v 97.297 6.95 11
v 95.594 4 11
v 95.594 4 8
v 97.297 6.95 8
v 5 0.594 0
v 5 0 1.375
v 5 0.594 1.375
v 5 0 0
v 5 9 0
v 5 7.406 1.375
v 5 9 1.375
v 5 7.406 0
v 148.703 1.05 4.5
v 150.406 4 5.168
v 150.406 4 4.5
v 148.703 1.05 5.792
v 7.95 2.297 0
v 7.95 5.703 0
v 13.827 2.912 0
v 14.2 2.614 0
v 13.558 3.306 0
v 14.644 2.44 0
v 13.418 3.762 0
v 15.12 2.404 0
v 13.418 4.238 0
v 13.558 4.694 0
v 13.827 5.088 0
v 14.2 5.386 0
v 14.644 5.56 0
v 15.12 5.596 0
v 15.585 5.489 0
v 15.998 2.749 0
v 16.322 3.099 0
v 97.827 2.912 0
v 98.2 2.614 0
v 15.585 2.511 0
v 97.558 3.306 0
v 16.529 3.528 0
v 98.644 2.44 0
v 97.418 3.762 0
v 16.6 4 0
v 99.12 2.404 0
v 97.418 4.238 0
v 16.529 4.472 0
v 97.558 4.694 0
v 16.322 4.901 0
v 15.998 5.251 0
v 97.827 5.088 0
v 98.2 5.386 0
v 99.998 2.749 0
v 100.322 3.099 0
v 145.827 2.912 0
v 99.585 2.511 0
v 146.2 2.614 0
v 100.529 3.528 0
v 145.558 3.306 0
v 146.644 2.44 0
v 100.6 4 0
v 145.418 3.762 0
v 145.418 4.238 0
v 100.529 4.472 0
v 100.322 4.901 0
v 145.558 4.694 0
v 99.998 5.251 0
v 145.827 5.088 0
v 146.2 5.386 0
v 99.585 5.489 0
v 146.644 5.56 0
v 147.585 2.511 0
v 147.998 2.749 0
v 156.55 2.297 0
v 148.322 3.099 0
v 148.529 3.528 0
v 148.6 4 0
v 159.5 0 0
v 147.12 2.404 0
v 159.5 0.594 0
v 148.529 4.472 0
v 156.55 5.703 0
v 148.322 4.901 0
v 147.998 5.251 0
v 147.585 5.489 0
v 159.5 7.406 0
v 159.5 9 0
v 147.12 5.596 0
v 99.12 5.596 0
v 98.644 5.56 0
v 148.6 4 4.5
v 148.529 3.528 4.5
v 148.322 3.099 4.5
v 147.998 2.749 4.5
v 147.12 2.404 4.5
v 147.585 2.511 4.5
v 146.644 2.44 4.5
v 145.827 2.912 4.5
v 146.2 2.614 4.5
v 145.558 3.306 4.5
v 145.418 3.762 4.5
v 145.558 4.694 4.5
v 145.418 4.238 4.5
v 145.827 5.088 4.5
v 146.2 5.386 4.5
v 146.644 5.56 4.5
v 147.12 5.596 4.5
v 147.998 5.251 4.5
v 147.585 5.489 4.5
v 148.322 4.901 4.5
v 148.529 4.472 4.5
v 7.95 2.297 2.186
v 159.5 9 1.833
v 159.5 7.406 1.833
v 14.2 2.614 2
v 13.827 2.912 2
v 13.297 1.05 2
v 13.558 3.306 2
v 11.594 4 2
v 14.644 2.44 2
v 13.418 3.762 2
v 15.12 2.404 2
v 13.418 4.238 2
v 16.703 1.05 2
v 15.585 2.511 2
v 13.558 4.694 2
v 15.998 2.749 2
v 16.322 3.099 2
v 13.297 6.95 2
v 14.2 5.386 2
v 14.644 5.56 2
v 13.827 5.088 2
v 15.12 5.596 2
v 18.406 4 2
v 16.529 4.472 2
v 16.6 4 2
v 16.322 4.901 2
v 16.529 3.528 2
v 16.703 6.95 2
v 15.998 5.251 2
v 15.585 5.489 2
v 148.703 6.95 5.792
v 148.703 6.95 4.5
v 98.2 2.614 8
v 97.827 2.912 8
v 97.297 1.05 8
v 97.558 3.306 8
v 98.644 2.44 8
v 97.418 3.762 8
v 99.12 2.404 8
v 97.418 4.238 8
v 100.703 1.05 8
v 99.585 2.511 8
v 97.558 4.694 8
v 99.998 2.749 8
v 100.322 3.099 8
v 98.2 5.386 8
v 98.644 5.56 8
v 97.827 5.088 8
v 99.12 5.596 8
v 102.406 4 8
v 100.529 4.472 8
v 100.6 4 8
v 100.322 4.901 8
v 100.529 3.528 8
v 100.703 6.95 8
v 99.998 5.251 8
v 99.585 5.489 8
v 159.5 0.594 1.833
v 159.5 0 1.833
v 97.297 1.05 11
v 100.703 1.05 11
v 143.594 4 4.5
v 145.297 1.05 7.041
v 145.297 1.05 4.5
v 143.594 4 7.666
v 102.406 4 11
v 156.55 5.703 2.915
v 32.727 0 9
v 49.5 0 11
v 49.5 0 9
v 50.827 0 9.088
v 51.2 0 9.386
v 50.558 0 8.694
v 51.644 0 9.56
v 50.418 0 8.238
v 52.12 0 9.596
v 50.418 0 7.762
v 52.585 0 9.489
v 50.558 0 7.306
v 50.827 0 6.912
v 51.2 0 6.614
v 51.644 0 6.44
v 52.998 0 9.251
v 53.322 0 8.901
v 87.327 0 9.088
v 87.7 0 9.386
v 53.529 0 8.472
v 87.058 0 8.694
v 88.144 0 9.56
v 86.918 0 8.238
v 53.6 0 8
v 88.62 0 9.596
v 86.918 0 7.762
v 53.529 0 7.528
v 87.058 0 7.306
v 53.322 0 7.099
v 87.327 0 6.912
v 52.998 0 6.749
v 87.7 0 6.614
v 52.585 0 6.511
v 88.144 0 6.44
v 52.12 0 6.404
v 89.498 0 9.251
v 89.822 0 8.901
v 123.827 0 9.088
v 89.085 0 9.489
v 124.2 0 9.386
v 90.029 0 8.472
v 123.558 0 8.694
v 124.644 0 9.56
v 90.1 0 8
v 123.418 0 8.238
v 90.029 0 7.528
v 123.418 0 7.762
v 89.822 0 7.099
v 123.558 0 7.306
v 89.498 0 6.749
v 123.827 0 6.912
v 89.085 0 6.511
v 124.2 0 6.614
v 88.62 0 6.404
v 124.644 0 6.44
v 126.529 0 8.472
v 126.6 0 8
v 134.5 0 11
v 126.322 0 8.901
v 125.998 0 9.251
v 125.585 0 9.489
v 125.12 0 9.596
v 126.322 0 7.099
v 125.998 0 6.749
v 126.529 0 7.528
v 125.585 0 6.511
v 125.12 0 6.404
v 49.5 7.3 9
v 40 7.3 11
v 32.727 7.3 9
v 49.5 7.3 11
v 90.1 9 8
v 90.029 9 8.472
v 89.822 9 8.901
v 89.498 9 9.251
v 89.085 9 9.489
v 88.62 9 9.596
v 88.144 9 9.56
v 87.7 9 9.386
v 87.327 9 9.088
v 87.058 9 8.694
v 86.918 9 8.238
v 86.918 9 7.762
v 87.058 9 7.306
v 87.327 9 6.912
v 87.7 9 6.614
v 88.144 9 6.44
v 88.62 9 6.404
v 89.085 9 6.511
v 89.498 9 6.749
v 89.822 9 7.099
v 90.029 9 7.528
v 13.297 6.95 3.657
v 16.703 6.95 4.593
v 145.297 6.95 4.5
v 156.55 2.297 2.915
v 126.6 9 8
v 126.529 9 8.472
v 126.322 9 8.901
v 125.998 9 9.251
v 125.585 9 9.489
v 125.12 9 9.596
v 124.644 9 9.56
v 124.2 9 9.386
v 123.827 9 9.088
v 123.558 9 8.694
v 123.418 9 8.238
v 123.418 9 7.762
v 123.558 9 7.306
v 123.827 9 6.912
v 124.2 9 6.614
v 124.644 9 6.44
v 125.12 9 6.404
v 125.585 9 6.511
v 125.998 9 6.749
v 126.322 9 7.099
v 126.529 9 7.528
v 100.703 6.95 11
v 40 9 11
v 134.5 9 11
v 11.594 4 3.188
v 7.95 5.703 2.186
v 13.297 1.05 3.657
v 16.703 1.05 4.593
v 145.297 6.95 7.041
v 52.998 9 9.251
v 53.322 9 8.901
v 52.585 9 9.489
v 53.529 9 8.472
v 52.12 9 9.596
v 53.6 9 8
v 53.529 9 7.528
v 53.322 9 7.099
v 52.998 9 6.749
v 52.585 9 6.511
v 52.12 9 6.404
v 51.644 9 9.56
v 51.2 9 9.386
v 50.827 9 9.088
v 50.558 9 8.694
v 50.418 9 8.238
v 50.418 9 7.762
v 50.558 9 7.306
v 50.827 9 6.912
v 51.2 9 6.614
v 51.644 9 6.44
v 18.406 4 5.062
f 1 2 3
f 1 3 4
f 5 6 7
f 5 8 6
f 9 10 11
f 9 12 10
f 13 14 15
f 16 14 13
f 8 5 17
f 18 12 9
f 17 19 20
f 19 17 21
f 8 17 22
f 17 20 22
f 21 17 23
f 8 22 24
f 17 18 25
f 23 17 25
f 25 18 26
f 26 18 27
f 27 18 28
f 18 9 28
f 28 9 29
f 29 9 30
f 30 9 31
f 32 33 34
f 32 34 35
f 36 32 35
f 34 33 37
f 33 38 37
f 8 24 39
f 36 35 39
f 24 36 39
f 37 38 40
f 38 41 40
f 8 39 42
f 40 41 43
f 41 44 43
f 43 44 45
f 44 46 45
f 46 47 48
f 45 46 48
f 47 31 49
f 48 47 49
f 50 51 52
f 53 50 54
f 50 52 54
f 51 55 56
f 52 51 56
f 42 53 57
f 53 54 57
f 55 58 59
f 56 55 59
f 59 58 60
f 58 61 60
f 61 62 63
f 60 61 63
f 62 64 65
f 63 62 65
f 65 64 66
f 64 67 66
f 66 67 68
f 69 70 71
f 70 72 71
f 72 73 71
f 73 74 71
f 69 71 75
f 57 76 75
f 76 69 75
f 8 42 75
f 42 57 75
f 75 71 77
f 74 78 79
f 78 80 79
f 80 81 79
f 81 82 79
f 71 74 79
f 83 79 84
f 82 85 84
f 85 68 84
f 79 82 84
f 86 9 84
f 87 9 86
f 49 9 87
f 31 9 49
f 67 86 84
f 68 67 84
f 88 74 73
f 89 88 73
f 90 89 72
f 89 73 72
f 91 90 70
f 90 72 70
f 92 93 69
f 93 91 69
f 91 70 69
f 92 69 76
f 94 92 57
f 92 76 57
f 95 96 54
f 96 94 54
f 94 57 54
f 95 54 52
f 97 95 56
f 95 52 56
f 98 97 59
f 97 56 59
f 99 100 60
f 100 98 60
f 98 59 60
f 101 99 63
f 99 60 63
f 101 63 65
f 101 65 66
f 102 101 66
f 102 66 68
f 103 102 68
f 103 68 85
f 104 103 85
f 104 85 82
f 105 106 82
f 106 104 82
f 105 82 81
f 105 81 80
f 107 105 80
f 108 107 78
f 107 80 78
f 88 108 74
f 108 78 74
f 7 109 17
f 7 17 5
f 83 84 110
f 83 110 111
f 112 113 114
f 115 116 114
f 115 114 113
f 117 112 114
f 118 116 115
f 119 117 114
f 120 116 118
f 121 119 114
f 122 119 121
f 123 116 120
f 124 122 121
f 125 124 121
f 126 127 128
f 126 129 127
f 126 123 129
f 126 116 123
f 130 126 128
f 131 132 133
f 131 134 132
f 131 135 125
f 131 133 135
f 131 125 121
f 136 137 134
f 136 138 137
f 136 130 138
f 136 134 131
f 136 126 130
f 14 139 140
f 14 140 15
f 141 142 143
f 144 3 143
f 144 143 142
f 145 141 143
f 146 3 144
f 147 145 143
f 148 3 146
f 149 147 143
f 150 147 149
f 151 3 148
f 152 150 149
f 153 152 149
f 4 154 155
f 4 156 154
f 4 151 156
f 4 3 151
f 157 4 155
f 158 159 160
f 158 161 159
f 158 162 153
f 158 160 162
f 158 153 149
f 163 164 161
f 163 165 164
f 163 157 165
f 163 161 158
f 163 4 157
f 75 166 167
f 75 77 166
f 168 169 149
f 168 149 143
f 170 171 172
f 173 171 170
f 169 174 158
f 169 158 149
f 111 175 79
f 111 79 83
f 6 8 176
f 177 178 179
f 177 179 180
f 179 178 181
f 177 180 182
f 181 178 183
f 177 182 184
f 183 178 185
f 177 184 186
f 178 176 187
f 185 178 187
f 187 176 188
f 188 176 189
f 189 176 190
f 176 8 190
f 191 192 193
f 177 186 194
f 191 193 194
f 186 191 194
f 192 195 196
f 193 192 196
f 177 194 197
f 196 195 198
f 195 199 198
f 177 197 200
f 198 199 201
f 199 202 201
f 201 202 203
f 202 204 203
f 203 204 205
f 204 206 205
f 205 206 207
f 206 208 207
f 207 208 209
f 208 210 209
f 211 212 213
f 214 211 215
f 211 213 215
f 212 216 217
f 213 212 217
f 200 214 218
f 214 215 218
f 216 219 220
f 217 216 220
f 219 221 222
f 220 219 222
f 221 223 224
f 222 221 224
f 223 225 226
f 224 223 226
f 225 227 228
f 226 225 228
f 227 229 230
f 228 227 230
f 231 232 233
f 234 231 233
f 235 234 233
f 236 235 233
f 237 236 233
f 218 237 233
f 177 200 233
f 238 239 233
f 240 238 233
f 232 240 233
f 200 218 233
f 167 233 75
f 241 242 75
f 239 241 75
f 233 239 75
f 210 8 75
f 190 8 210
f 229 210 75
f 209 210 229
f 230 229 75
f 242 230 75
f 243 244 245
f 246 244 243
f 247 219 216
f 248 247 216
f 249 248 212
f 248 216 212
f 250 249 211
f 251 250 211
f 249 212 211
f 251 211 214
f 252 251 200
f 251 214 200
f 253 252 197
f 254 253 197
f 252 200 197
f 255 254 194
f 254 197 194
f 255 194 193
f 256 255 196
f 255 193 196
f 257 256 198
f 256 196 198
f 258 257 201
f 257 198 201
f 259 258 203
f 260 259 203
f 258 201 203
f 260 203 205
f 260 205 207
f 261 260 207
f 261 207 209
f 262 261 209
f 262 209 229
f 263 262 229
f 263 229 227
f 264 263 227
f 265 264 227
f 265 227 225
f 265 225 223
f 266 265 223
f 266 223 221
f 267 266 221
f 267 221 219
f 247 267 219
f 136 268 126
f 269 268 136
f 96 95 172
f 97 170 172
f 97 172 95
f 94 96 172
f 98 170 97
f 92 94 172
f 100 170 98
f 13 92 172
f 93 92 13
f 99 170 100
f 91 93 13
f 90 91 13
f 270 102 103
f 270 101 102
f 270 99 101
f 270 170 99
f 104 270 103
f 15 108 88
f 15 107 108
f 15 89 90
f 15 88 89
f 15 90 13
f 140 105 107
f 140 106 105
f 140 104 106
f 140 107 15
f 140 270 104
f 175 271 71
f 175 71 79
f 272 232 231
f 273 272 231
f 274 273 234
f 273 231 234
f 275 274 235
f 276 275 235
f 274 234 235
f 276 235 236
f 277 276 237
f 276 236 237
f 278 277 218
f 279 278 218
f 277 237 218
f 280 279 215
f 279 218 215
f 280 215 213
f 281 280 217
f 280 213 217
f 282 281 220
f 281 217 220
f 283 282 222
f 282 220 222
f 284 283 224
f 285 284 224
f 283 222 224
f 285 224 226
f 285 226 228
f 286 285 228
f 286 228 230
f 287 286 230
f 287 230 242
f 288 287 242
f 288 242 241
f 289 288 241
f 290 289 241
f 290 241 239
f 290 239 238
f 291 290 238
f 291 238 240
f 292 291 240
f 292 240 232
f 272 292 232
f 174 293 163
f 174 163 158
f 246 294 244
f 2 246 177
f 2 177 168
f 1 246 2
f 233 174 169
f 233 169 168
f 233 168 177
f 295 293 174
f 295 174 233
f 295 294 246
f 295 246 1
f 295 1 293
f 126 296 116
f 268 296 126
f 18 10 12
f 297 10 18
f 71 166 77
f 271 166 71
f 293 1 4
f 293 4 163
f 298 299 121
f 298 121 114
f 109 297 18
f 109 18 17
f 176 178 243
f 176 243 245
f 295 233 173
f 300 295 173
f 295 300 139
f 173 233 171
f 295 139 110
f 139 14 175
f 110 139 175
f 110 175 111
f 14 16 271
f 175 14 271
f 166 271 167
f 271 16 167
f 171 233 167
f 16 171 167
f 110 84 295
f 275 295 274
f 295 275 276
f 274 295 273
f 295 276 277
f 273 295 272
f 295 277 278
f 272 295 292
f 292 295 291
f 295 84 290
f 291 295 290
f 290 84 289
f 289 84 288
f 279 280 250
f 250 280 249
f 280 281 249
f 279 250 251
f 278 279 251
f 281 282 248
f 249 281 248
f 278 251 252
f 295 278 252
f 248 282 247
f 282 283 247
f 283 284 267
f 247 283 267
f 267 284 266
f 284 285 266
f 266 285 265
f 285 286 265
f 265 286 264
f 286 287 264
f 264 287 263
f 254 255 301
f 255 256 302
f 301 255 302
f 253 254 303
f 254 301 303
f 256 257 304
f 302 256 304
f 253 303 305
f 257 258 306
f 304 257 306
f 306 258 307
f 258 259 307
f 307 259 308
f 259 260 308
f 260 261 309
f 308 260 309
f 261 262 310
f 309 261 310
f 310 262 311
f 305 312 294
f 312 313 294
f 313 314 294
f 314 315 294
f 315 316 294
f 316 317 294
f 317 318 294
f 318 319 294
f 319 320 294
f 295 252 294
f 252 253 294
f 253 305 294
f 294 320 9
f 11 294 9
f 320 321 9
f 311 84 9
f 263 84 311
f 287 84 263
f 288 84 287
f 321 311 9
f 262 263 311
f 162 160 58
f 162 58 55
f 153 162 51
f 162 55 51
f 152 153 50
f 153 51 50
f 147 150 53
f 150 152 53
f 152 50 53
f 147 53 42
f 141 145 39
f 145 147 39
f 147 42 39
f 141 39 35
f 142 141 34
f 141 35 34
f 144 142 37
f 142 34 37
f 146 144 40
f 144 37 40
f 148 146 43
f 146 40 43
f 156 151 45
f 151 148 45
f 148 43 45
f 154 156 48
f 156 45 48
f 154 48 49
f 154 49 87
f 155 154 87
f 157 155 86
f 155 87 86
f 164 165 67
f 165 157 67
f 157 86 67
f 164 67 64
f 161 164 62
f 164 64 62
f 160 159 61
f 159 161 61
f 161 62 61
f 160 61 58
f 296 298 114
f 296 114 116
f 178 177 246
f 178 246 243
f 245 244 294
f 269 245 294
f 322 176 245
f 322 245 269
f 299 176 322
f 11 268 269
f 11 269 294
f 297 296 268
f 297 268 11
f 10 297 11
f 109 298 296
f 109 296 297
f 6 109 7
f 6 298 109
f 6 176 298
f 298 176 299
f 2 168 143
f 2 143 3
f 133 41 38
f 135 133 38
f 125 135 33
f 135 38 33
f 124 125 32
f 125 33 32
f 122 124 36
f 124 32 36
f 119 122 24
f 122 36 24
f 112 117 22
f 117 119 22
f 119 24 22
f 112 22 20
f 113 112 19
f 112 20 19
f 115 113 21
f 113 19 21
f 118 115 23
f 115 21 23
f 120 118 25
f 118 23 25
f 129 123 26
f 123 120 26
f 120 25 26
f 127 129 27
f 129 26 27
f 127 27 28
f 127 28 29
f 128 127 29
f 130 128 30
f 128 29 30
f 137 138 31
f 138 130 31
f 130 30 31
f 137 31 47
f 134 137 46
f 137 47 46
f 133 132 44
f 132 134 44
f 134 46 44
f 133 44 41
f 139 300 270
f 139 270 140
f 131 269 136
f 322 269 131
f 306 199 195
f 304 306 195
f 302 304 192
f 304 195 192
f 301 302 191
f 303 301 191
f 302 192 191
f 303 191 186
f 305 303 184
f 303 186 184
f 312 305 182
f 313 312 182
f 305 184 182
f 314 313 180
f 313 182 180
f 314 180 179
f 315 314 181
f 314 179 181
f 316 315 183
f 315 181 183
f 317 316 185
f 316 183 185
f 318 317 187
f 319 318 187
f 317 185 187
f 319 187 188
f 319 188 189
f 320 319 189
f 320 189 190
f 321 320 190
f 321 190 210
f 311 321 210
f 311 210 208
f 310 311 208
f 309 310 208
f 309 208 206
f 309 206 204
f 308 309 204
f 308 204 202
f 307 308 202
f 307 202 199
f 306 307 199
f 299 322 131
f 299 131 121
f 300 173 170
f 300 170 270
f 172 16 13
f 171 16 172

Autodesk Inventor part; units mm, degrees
ref_plane "YZ Plane" through (0, 0, 0) normal (1, 0, 0) x (0, 1, 0)
ref_plane "XZ Plane" through (0, 0, 0) normal (0, 1, 0) x (-1, 0, 0)
ref_plane "XY Plane" through (0, 0, 0) normal (0, 0, 1) x (1, 0, 0)
sketch "Sketch1" plane through (0, 0, 0) normal (0, 0, 1) x (1, 0, 0)
  line L0 (0, 0) -> (164.5, 0)
  line L1 (164.5, 0) -> (164.5, 9)
  line L2 (164.5, 9) -> (0, 9)
  line L3 (0, 9) -> (0, 0)
  circle A0 centre (99, 4) radius 1.6
  circle A1 centre (159.5, 4) radius 1.6
  circle A2 centre (147, 4) radius 1.6
  circle A3 centre (15, 4) radius 1.6
  circle A4 centre (5, 4) radius 1.6
  dimension "d1" = 9
  dimension "d2" = 90
  dimension "d6" = 3.2
  dimension "d7" = 3.2
  dimension "d9" = 60.5
  dimension "d26" = 3.2
  dimension "d27" = 48
  dimension "d28" = 3.2
  dimension "d32" = 15
  dimension "d33" = 5
  dimension "d61" = 3.2
  dimension "d62" = 10
  dimension "d63" = 12.5
  dimension "d108" = 4
  dimension "d109" = 4
  dimension "d111" = 4
  dimension "d112" = 4
  dimension "d113" = 4
ref_plane "Work Plane2" through (0, 0, 0) normal (0, -1, 0) x (1, 0, 0)
sketch "Sketch2" plane through (0, 0, 0) normal (0, -1, 0) x (1, 0, 0)
  circle A0 centre (52, 8) radius 1.6
  circle A1 centre (125, 8) radius 1.6
  circle A2 centre (88.5, 8) radius 1.6
  point P0 (0, 0)
  point P1 (52, 0)
  dimension "d13" = 3.2
  dimension "d15" = 3.2
  dimension "d17" = 3.2
  dimension "d18" = 36.5
  dimension "d64" = 52
  dimension "d65" = 36.5
  dimension "d114" = 8
  dimension "d115" = 73
ref_plane "Work Plane1" through (0, 0, 11) normal (0, 0, 1) x (1, 0, 0)
extrude "klocek" add sketch "Sketch1" along normal blind 11
ref_plane "Work Plane3" through (0, 0, 0) normal (0, -1, 0) x (1, 0, 0)
extrude "prowadzenie osi" cut sketch "Sketch2" against normal up to next
ref_plane "Work Plane4" through (0, 0, 0) normal (0, -1, 0) x (1, 0, 0)
sketch "Sketch7" plane through (0, 0, 0) normal (0, -1, 0) x (1, 0, 0)
  line L0 (0, 11) -> (0, 0)
  line L1 (0, 11) -> (164.5, 11) projected
  line L2 (0, 11) -> (40, 11)
  line L3 (40, 11) -> (0, 0)
  point P0 (0, -1.8333)
  dimension "d86" = 11
  dimension "d87" = 40
sketch "Sketch8" plane through (0, 0, 0) normal (0, -1, 0) x (1, 0, 0)
  line L0 (164.5, 0) -> (164.5, 11) projected
  line L1 (164.5, 11) -> (164.5, 0)
  line L2 (164.5, 11) -> (0, 11) projected
  line L3 (164.5, 11) -> (134.5, 11)
  line L4 (134.5, 11) -> (164.5, 0)
  point P0 (0, 0)
  point P1 (40.8333, 11)
  dimension "d80" = 11
  dimension "d81" = 30
extrude "przedni skos" cut sketch "Sketch7" against normal up to next
extrude "tylni skos" cut sketch "Sketch8" against normal up to next
ref_plane "Work Plane7" through (0, 0, 11) normal (0, 0, 1) x (1, 0, 0)
sketch "Sketch5" plane through (0, 0, 11) normal (0, 0, 1) x (1, 0, 0)
  circle A0 centre (99, 4) radius 1.6 projected
  line L0 (95.5936, 4) -> (97.2968, 6.95)
  line L1 (97.2968, 6.95) -> (100.7032, 6.95)
  line L2 (100.7032, 6.95) -> (102.4064, 4)
  line L3 (102.4064, 4) -> (100.7032, 1.05)
  line L4 (100.7032, 1.05) -> (97.2968, 1.05)
  line L5 (97.2968, 1.05) -> (95.5936, 4)
  point P0 (119.5, 5)
  dimension "d98" = 5.9
extrude "hex insert middle" cut sketch "Sketch5" against normal blind 3
ref_plane "Work Plane6" through (0, 0, 11) normal (0, 0, 1) x (1, 0, 0)
sketch "Sketch9" plane through (0, 0, 11) normal (0, 0, 1) x (1, 0, 0)
  circle A0 centre (147, 4) radius 1.6 projected
  line L0 (150.4064, 4) -> (148.7032, 1.05)
  line L1 (148.7032, 1.05) -> (145.2968, 1.05)
  line L2 (145.2968, 1.05) -> (143.5936, 4)
  line L3 (143.5936, 4) -> (145.2968, 6.95)
  line L4 (145.2968, 6.95) -> (148.7032, 6.95)
  line L5 (148.7032, 6.95) -> (150.4064, 4)
  point P0 (0, 0)
  point P1 (153, 5)
  dimension "d99" = 5.9
extrude "hex insert rear 1" cut sketch "Sketch9" against normal blind 6.5
ref_plane "Work Plane5" through (0, 0, 11) normal (0, 0, 1) x (1, 0, 0)
sketch "Sketch10" plane through (0, 0, 11) normal (0, 0, 1) x (1, 0, 0)
  circle A0 centre (159.5, 4) radius 1.6 projected
  line L0 (162.45, 5.7032) -> (162.45, 2.2968)
  line L1 (162.45, 2.2968) -> (159.5, 0.5936)
  line L2 (159.5, 0.5936) -> (156.55, 2.2968)
  line L3 (156.55, 2.2968) -> (156.55, 5.7032)
  line L4 (156.55, 5.7032) -> (159.5, 7.4064)
  line L5 (159.5, 7.4064) -> (162.45, 5.7032)
  line L6 (164.5, 0) -> (134.5, 0) projected
  point P0 (0, 0)
  dimension "d118" = 5.9
extrude "hex insert rear 2" cut sketch "Sketch10" against normal up to next contours A0 | L0 L1 L2 L3 L4 L5
sketch "Sketch13" plane through (0, 0, 11) normal (0, 0, 1) x (1, 0, 0)
  line L0 (9.54, 0) -> (-1.59, 0) projected
  line L1 (7.95, 2.2968) -> (5, 0.5936)
  line L2 (5, 0.5936) -> (2.05, 2.2968)
  line L3 (2.05, 2.2968) -> (2.05, 5.7032)
  line L4 (2.05, 5.7032) -> (5, 7.4064)
  line L5 (5, 7.4064) -> (7.95, 5.7032)
  line L6 (7.95, 5.7032) -> (7.95, 2.2968)
  point P0 (0, 0)
  point P1 (5, 4)
  point P2 (5, 4)
  dimension "d117" = 5.9
extrude "hex insert front 1" cut sketch "Sketch13" against normal through all
sketch "Sketch16" plane through (0, 0, 11) normal (0, 0, 1) x (1, 0, 0)
  circle A0 centre (15, 4) radius 1.6 projected
  line L0 (18.4064, 4) -> (16.7032, 1.05)
  line L1 (16.7032, 1.05) -> (13.2968, 1.05)
  line L2 (13.2968, 1.05) -> (11.5936, 4)
  line L3 (11.5936, 4) -> (13.2968, 6.95)
  line L4 (13.2968, 6.95) -> (16.7032, 6.95)
  line L5 (16.7032, 6.95) -> (18.4064, 4)
  point P0 (0, 0)
  dimension "d93" = 5.9
extrude "hex insert front 2" cut sketch "Sketch16" against normal blind 9
sketch "Sketch17" plane through (0, 0, 0) normal (0, 0, -1) x (-1, 0, 0)
  line L0 (0, 9) -> (0, 0) projected
  line L1 (0, 0) -> (-5, 0)
  line L2 (-5, 0) -> (-5, 10.0042)
  line L3 (-5, 10.0042) -> (0, 10.0042)
  line L4 (0, 10.0042) -> (0, 0)
  point P0 (-5, 7.4064)
extrude "ciecie przod" cut sketch "Sketch17" against normal up to next
sketch "Sketch18" plane through (40, 0, 11) normal (0, -1, 0) x (1, 0, 0)
  line L0 (9.5, 0) -> (9.5, -2)
  line L1 (9.5, -2) -> (-7.5, -2)
  line L2 (-7.5, -2) -> (-7.5, 0)
  line L3 (-7.5, 0) -> (9.5, 0)
  line L4 (94.5, 0) -> (0, 0) projected
  circle A0 centre (12, -3) radius 1.6 projected
  line L5 (-35, -11) -> (124.5, -11) projected
  point P0 (-40, -11)
  dimension "d102" = 2
  dimension "d103" = 17
  dimension "d104" = 2.5
extrude "sensor linii" cut sketch "Sketch18" against normal blind 7.3 contours L0 L1 L2 L3
sketch "Sketch21" plane through (0, 0, 0) normal (0, 0, -1) x (-1, 0, 0)
  line L0 (-159.5, 8.9293) -> (-159.5, 0)
  line L1 (-164.5, 0) -> (-134.5, 0) projected
  line L2 (-159.5, 0) -> (-164.5, 0)
  line L3 (-164.5, 0) -> (-164.5, 9)
  line L4 (-164.5, 9) -> (-159.5, 9)
  line L5 (-159.5, 9) -> (-159.5, 8.9293)
  line L6 (-134.5, 9) -> (-164.5, 9) projected
  line L7 (-164.5, 9) -> (-164.5, 0) projected
  point P0 (0, 0)
extrude "ciecie tyl" cut sketch "Sketch21" against normal up to next
properties part number "wheel_support_v4_narrow_with_line_sensor"
